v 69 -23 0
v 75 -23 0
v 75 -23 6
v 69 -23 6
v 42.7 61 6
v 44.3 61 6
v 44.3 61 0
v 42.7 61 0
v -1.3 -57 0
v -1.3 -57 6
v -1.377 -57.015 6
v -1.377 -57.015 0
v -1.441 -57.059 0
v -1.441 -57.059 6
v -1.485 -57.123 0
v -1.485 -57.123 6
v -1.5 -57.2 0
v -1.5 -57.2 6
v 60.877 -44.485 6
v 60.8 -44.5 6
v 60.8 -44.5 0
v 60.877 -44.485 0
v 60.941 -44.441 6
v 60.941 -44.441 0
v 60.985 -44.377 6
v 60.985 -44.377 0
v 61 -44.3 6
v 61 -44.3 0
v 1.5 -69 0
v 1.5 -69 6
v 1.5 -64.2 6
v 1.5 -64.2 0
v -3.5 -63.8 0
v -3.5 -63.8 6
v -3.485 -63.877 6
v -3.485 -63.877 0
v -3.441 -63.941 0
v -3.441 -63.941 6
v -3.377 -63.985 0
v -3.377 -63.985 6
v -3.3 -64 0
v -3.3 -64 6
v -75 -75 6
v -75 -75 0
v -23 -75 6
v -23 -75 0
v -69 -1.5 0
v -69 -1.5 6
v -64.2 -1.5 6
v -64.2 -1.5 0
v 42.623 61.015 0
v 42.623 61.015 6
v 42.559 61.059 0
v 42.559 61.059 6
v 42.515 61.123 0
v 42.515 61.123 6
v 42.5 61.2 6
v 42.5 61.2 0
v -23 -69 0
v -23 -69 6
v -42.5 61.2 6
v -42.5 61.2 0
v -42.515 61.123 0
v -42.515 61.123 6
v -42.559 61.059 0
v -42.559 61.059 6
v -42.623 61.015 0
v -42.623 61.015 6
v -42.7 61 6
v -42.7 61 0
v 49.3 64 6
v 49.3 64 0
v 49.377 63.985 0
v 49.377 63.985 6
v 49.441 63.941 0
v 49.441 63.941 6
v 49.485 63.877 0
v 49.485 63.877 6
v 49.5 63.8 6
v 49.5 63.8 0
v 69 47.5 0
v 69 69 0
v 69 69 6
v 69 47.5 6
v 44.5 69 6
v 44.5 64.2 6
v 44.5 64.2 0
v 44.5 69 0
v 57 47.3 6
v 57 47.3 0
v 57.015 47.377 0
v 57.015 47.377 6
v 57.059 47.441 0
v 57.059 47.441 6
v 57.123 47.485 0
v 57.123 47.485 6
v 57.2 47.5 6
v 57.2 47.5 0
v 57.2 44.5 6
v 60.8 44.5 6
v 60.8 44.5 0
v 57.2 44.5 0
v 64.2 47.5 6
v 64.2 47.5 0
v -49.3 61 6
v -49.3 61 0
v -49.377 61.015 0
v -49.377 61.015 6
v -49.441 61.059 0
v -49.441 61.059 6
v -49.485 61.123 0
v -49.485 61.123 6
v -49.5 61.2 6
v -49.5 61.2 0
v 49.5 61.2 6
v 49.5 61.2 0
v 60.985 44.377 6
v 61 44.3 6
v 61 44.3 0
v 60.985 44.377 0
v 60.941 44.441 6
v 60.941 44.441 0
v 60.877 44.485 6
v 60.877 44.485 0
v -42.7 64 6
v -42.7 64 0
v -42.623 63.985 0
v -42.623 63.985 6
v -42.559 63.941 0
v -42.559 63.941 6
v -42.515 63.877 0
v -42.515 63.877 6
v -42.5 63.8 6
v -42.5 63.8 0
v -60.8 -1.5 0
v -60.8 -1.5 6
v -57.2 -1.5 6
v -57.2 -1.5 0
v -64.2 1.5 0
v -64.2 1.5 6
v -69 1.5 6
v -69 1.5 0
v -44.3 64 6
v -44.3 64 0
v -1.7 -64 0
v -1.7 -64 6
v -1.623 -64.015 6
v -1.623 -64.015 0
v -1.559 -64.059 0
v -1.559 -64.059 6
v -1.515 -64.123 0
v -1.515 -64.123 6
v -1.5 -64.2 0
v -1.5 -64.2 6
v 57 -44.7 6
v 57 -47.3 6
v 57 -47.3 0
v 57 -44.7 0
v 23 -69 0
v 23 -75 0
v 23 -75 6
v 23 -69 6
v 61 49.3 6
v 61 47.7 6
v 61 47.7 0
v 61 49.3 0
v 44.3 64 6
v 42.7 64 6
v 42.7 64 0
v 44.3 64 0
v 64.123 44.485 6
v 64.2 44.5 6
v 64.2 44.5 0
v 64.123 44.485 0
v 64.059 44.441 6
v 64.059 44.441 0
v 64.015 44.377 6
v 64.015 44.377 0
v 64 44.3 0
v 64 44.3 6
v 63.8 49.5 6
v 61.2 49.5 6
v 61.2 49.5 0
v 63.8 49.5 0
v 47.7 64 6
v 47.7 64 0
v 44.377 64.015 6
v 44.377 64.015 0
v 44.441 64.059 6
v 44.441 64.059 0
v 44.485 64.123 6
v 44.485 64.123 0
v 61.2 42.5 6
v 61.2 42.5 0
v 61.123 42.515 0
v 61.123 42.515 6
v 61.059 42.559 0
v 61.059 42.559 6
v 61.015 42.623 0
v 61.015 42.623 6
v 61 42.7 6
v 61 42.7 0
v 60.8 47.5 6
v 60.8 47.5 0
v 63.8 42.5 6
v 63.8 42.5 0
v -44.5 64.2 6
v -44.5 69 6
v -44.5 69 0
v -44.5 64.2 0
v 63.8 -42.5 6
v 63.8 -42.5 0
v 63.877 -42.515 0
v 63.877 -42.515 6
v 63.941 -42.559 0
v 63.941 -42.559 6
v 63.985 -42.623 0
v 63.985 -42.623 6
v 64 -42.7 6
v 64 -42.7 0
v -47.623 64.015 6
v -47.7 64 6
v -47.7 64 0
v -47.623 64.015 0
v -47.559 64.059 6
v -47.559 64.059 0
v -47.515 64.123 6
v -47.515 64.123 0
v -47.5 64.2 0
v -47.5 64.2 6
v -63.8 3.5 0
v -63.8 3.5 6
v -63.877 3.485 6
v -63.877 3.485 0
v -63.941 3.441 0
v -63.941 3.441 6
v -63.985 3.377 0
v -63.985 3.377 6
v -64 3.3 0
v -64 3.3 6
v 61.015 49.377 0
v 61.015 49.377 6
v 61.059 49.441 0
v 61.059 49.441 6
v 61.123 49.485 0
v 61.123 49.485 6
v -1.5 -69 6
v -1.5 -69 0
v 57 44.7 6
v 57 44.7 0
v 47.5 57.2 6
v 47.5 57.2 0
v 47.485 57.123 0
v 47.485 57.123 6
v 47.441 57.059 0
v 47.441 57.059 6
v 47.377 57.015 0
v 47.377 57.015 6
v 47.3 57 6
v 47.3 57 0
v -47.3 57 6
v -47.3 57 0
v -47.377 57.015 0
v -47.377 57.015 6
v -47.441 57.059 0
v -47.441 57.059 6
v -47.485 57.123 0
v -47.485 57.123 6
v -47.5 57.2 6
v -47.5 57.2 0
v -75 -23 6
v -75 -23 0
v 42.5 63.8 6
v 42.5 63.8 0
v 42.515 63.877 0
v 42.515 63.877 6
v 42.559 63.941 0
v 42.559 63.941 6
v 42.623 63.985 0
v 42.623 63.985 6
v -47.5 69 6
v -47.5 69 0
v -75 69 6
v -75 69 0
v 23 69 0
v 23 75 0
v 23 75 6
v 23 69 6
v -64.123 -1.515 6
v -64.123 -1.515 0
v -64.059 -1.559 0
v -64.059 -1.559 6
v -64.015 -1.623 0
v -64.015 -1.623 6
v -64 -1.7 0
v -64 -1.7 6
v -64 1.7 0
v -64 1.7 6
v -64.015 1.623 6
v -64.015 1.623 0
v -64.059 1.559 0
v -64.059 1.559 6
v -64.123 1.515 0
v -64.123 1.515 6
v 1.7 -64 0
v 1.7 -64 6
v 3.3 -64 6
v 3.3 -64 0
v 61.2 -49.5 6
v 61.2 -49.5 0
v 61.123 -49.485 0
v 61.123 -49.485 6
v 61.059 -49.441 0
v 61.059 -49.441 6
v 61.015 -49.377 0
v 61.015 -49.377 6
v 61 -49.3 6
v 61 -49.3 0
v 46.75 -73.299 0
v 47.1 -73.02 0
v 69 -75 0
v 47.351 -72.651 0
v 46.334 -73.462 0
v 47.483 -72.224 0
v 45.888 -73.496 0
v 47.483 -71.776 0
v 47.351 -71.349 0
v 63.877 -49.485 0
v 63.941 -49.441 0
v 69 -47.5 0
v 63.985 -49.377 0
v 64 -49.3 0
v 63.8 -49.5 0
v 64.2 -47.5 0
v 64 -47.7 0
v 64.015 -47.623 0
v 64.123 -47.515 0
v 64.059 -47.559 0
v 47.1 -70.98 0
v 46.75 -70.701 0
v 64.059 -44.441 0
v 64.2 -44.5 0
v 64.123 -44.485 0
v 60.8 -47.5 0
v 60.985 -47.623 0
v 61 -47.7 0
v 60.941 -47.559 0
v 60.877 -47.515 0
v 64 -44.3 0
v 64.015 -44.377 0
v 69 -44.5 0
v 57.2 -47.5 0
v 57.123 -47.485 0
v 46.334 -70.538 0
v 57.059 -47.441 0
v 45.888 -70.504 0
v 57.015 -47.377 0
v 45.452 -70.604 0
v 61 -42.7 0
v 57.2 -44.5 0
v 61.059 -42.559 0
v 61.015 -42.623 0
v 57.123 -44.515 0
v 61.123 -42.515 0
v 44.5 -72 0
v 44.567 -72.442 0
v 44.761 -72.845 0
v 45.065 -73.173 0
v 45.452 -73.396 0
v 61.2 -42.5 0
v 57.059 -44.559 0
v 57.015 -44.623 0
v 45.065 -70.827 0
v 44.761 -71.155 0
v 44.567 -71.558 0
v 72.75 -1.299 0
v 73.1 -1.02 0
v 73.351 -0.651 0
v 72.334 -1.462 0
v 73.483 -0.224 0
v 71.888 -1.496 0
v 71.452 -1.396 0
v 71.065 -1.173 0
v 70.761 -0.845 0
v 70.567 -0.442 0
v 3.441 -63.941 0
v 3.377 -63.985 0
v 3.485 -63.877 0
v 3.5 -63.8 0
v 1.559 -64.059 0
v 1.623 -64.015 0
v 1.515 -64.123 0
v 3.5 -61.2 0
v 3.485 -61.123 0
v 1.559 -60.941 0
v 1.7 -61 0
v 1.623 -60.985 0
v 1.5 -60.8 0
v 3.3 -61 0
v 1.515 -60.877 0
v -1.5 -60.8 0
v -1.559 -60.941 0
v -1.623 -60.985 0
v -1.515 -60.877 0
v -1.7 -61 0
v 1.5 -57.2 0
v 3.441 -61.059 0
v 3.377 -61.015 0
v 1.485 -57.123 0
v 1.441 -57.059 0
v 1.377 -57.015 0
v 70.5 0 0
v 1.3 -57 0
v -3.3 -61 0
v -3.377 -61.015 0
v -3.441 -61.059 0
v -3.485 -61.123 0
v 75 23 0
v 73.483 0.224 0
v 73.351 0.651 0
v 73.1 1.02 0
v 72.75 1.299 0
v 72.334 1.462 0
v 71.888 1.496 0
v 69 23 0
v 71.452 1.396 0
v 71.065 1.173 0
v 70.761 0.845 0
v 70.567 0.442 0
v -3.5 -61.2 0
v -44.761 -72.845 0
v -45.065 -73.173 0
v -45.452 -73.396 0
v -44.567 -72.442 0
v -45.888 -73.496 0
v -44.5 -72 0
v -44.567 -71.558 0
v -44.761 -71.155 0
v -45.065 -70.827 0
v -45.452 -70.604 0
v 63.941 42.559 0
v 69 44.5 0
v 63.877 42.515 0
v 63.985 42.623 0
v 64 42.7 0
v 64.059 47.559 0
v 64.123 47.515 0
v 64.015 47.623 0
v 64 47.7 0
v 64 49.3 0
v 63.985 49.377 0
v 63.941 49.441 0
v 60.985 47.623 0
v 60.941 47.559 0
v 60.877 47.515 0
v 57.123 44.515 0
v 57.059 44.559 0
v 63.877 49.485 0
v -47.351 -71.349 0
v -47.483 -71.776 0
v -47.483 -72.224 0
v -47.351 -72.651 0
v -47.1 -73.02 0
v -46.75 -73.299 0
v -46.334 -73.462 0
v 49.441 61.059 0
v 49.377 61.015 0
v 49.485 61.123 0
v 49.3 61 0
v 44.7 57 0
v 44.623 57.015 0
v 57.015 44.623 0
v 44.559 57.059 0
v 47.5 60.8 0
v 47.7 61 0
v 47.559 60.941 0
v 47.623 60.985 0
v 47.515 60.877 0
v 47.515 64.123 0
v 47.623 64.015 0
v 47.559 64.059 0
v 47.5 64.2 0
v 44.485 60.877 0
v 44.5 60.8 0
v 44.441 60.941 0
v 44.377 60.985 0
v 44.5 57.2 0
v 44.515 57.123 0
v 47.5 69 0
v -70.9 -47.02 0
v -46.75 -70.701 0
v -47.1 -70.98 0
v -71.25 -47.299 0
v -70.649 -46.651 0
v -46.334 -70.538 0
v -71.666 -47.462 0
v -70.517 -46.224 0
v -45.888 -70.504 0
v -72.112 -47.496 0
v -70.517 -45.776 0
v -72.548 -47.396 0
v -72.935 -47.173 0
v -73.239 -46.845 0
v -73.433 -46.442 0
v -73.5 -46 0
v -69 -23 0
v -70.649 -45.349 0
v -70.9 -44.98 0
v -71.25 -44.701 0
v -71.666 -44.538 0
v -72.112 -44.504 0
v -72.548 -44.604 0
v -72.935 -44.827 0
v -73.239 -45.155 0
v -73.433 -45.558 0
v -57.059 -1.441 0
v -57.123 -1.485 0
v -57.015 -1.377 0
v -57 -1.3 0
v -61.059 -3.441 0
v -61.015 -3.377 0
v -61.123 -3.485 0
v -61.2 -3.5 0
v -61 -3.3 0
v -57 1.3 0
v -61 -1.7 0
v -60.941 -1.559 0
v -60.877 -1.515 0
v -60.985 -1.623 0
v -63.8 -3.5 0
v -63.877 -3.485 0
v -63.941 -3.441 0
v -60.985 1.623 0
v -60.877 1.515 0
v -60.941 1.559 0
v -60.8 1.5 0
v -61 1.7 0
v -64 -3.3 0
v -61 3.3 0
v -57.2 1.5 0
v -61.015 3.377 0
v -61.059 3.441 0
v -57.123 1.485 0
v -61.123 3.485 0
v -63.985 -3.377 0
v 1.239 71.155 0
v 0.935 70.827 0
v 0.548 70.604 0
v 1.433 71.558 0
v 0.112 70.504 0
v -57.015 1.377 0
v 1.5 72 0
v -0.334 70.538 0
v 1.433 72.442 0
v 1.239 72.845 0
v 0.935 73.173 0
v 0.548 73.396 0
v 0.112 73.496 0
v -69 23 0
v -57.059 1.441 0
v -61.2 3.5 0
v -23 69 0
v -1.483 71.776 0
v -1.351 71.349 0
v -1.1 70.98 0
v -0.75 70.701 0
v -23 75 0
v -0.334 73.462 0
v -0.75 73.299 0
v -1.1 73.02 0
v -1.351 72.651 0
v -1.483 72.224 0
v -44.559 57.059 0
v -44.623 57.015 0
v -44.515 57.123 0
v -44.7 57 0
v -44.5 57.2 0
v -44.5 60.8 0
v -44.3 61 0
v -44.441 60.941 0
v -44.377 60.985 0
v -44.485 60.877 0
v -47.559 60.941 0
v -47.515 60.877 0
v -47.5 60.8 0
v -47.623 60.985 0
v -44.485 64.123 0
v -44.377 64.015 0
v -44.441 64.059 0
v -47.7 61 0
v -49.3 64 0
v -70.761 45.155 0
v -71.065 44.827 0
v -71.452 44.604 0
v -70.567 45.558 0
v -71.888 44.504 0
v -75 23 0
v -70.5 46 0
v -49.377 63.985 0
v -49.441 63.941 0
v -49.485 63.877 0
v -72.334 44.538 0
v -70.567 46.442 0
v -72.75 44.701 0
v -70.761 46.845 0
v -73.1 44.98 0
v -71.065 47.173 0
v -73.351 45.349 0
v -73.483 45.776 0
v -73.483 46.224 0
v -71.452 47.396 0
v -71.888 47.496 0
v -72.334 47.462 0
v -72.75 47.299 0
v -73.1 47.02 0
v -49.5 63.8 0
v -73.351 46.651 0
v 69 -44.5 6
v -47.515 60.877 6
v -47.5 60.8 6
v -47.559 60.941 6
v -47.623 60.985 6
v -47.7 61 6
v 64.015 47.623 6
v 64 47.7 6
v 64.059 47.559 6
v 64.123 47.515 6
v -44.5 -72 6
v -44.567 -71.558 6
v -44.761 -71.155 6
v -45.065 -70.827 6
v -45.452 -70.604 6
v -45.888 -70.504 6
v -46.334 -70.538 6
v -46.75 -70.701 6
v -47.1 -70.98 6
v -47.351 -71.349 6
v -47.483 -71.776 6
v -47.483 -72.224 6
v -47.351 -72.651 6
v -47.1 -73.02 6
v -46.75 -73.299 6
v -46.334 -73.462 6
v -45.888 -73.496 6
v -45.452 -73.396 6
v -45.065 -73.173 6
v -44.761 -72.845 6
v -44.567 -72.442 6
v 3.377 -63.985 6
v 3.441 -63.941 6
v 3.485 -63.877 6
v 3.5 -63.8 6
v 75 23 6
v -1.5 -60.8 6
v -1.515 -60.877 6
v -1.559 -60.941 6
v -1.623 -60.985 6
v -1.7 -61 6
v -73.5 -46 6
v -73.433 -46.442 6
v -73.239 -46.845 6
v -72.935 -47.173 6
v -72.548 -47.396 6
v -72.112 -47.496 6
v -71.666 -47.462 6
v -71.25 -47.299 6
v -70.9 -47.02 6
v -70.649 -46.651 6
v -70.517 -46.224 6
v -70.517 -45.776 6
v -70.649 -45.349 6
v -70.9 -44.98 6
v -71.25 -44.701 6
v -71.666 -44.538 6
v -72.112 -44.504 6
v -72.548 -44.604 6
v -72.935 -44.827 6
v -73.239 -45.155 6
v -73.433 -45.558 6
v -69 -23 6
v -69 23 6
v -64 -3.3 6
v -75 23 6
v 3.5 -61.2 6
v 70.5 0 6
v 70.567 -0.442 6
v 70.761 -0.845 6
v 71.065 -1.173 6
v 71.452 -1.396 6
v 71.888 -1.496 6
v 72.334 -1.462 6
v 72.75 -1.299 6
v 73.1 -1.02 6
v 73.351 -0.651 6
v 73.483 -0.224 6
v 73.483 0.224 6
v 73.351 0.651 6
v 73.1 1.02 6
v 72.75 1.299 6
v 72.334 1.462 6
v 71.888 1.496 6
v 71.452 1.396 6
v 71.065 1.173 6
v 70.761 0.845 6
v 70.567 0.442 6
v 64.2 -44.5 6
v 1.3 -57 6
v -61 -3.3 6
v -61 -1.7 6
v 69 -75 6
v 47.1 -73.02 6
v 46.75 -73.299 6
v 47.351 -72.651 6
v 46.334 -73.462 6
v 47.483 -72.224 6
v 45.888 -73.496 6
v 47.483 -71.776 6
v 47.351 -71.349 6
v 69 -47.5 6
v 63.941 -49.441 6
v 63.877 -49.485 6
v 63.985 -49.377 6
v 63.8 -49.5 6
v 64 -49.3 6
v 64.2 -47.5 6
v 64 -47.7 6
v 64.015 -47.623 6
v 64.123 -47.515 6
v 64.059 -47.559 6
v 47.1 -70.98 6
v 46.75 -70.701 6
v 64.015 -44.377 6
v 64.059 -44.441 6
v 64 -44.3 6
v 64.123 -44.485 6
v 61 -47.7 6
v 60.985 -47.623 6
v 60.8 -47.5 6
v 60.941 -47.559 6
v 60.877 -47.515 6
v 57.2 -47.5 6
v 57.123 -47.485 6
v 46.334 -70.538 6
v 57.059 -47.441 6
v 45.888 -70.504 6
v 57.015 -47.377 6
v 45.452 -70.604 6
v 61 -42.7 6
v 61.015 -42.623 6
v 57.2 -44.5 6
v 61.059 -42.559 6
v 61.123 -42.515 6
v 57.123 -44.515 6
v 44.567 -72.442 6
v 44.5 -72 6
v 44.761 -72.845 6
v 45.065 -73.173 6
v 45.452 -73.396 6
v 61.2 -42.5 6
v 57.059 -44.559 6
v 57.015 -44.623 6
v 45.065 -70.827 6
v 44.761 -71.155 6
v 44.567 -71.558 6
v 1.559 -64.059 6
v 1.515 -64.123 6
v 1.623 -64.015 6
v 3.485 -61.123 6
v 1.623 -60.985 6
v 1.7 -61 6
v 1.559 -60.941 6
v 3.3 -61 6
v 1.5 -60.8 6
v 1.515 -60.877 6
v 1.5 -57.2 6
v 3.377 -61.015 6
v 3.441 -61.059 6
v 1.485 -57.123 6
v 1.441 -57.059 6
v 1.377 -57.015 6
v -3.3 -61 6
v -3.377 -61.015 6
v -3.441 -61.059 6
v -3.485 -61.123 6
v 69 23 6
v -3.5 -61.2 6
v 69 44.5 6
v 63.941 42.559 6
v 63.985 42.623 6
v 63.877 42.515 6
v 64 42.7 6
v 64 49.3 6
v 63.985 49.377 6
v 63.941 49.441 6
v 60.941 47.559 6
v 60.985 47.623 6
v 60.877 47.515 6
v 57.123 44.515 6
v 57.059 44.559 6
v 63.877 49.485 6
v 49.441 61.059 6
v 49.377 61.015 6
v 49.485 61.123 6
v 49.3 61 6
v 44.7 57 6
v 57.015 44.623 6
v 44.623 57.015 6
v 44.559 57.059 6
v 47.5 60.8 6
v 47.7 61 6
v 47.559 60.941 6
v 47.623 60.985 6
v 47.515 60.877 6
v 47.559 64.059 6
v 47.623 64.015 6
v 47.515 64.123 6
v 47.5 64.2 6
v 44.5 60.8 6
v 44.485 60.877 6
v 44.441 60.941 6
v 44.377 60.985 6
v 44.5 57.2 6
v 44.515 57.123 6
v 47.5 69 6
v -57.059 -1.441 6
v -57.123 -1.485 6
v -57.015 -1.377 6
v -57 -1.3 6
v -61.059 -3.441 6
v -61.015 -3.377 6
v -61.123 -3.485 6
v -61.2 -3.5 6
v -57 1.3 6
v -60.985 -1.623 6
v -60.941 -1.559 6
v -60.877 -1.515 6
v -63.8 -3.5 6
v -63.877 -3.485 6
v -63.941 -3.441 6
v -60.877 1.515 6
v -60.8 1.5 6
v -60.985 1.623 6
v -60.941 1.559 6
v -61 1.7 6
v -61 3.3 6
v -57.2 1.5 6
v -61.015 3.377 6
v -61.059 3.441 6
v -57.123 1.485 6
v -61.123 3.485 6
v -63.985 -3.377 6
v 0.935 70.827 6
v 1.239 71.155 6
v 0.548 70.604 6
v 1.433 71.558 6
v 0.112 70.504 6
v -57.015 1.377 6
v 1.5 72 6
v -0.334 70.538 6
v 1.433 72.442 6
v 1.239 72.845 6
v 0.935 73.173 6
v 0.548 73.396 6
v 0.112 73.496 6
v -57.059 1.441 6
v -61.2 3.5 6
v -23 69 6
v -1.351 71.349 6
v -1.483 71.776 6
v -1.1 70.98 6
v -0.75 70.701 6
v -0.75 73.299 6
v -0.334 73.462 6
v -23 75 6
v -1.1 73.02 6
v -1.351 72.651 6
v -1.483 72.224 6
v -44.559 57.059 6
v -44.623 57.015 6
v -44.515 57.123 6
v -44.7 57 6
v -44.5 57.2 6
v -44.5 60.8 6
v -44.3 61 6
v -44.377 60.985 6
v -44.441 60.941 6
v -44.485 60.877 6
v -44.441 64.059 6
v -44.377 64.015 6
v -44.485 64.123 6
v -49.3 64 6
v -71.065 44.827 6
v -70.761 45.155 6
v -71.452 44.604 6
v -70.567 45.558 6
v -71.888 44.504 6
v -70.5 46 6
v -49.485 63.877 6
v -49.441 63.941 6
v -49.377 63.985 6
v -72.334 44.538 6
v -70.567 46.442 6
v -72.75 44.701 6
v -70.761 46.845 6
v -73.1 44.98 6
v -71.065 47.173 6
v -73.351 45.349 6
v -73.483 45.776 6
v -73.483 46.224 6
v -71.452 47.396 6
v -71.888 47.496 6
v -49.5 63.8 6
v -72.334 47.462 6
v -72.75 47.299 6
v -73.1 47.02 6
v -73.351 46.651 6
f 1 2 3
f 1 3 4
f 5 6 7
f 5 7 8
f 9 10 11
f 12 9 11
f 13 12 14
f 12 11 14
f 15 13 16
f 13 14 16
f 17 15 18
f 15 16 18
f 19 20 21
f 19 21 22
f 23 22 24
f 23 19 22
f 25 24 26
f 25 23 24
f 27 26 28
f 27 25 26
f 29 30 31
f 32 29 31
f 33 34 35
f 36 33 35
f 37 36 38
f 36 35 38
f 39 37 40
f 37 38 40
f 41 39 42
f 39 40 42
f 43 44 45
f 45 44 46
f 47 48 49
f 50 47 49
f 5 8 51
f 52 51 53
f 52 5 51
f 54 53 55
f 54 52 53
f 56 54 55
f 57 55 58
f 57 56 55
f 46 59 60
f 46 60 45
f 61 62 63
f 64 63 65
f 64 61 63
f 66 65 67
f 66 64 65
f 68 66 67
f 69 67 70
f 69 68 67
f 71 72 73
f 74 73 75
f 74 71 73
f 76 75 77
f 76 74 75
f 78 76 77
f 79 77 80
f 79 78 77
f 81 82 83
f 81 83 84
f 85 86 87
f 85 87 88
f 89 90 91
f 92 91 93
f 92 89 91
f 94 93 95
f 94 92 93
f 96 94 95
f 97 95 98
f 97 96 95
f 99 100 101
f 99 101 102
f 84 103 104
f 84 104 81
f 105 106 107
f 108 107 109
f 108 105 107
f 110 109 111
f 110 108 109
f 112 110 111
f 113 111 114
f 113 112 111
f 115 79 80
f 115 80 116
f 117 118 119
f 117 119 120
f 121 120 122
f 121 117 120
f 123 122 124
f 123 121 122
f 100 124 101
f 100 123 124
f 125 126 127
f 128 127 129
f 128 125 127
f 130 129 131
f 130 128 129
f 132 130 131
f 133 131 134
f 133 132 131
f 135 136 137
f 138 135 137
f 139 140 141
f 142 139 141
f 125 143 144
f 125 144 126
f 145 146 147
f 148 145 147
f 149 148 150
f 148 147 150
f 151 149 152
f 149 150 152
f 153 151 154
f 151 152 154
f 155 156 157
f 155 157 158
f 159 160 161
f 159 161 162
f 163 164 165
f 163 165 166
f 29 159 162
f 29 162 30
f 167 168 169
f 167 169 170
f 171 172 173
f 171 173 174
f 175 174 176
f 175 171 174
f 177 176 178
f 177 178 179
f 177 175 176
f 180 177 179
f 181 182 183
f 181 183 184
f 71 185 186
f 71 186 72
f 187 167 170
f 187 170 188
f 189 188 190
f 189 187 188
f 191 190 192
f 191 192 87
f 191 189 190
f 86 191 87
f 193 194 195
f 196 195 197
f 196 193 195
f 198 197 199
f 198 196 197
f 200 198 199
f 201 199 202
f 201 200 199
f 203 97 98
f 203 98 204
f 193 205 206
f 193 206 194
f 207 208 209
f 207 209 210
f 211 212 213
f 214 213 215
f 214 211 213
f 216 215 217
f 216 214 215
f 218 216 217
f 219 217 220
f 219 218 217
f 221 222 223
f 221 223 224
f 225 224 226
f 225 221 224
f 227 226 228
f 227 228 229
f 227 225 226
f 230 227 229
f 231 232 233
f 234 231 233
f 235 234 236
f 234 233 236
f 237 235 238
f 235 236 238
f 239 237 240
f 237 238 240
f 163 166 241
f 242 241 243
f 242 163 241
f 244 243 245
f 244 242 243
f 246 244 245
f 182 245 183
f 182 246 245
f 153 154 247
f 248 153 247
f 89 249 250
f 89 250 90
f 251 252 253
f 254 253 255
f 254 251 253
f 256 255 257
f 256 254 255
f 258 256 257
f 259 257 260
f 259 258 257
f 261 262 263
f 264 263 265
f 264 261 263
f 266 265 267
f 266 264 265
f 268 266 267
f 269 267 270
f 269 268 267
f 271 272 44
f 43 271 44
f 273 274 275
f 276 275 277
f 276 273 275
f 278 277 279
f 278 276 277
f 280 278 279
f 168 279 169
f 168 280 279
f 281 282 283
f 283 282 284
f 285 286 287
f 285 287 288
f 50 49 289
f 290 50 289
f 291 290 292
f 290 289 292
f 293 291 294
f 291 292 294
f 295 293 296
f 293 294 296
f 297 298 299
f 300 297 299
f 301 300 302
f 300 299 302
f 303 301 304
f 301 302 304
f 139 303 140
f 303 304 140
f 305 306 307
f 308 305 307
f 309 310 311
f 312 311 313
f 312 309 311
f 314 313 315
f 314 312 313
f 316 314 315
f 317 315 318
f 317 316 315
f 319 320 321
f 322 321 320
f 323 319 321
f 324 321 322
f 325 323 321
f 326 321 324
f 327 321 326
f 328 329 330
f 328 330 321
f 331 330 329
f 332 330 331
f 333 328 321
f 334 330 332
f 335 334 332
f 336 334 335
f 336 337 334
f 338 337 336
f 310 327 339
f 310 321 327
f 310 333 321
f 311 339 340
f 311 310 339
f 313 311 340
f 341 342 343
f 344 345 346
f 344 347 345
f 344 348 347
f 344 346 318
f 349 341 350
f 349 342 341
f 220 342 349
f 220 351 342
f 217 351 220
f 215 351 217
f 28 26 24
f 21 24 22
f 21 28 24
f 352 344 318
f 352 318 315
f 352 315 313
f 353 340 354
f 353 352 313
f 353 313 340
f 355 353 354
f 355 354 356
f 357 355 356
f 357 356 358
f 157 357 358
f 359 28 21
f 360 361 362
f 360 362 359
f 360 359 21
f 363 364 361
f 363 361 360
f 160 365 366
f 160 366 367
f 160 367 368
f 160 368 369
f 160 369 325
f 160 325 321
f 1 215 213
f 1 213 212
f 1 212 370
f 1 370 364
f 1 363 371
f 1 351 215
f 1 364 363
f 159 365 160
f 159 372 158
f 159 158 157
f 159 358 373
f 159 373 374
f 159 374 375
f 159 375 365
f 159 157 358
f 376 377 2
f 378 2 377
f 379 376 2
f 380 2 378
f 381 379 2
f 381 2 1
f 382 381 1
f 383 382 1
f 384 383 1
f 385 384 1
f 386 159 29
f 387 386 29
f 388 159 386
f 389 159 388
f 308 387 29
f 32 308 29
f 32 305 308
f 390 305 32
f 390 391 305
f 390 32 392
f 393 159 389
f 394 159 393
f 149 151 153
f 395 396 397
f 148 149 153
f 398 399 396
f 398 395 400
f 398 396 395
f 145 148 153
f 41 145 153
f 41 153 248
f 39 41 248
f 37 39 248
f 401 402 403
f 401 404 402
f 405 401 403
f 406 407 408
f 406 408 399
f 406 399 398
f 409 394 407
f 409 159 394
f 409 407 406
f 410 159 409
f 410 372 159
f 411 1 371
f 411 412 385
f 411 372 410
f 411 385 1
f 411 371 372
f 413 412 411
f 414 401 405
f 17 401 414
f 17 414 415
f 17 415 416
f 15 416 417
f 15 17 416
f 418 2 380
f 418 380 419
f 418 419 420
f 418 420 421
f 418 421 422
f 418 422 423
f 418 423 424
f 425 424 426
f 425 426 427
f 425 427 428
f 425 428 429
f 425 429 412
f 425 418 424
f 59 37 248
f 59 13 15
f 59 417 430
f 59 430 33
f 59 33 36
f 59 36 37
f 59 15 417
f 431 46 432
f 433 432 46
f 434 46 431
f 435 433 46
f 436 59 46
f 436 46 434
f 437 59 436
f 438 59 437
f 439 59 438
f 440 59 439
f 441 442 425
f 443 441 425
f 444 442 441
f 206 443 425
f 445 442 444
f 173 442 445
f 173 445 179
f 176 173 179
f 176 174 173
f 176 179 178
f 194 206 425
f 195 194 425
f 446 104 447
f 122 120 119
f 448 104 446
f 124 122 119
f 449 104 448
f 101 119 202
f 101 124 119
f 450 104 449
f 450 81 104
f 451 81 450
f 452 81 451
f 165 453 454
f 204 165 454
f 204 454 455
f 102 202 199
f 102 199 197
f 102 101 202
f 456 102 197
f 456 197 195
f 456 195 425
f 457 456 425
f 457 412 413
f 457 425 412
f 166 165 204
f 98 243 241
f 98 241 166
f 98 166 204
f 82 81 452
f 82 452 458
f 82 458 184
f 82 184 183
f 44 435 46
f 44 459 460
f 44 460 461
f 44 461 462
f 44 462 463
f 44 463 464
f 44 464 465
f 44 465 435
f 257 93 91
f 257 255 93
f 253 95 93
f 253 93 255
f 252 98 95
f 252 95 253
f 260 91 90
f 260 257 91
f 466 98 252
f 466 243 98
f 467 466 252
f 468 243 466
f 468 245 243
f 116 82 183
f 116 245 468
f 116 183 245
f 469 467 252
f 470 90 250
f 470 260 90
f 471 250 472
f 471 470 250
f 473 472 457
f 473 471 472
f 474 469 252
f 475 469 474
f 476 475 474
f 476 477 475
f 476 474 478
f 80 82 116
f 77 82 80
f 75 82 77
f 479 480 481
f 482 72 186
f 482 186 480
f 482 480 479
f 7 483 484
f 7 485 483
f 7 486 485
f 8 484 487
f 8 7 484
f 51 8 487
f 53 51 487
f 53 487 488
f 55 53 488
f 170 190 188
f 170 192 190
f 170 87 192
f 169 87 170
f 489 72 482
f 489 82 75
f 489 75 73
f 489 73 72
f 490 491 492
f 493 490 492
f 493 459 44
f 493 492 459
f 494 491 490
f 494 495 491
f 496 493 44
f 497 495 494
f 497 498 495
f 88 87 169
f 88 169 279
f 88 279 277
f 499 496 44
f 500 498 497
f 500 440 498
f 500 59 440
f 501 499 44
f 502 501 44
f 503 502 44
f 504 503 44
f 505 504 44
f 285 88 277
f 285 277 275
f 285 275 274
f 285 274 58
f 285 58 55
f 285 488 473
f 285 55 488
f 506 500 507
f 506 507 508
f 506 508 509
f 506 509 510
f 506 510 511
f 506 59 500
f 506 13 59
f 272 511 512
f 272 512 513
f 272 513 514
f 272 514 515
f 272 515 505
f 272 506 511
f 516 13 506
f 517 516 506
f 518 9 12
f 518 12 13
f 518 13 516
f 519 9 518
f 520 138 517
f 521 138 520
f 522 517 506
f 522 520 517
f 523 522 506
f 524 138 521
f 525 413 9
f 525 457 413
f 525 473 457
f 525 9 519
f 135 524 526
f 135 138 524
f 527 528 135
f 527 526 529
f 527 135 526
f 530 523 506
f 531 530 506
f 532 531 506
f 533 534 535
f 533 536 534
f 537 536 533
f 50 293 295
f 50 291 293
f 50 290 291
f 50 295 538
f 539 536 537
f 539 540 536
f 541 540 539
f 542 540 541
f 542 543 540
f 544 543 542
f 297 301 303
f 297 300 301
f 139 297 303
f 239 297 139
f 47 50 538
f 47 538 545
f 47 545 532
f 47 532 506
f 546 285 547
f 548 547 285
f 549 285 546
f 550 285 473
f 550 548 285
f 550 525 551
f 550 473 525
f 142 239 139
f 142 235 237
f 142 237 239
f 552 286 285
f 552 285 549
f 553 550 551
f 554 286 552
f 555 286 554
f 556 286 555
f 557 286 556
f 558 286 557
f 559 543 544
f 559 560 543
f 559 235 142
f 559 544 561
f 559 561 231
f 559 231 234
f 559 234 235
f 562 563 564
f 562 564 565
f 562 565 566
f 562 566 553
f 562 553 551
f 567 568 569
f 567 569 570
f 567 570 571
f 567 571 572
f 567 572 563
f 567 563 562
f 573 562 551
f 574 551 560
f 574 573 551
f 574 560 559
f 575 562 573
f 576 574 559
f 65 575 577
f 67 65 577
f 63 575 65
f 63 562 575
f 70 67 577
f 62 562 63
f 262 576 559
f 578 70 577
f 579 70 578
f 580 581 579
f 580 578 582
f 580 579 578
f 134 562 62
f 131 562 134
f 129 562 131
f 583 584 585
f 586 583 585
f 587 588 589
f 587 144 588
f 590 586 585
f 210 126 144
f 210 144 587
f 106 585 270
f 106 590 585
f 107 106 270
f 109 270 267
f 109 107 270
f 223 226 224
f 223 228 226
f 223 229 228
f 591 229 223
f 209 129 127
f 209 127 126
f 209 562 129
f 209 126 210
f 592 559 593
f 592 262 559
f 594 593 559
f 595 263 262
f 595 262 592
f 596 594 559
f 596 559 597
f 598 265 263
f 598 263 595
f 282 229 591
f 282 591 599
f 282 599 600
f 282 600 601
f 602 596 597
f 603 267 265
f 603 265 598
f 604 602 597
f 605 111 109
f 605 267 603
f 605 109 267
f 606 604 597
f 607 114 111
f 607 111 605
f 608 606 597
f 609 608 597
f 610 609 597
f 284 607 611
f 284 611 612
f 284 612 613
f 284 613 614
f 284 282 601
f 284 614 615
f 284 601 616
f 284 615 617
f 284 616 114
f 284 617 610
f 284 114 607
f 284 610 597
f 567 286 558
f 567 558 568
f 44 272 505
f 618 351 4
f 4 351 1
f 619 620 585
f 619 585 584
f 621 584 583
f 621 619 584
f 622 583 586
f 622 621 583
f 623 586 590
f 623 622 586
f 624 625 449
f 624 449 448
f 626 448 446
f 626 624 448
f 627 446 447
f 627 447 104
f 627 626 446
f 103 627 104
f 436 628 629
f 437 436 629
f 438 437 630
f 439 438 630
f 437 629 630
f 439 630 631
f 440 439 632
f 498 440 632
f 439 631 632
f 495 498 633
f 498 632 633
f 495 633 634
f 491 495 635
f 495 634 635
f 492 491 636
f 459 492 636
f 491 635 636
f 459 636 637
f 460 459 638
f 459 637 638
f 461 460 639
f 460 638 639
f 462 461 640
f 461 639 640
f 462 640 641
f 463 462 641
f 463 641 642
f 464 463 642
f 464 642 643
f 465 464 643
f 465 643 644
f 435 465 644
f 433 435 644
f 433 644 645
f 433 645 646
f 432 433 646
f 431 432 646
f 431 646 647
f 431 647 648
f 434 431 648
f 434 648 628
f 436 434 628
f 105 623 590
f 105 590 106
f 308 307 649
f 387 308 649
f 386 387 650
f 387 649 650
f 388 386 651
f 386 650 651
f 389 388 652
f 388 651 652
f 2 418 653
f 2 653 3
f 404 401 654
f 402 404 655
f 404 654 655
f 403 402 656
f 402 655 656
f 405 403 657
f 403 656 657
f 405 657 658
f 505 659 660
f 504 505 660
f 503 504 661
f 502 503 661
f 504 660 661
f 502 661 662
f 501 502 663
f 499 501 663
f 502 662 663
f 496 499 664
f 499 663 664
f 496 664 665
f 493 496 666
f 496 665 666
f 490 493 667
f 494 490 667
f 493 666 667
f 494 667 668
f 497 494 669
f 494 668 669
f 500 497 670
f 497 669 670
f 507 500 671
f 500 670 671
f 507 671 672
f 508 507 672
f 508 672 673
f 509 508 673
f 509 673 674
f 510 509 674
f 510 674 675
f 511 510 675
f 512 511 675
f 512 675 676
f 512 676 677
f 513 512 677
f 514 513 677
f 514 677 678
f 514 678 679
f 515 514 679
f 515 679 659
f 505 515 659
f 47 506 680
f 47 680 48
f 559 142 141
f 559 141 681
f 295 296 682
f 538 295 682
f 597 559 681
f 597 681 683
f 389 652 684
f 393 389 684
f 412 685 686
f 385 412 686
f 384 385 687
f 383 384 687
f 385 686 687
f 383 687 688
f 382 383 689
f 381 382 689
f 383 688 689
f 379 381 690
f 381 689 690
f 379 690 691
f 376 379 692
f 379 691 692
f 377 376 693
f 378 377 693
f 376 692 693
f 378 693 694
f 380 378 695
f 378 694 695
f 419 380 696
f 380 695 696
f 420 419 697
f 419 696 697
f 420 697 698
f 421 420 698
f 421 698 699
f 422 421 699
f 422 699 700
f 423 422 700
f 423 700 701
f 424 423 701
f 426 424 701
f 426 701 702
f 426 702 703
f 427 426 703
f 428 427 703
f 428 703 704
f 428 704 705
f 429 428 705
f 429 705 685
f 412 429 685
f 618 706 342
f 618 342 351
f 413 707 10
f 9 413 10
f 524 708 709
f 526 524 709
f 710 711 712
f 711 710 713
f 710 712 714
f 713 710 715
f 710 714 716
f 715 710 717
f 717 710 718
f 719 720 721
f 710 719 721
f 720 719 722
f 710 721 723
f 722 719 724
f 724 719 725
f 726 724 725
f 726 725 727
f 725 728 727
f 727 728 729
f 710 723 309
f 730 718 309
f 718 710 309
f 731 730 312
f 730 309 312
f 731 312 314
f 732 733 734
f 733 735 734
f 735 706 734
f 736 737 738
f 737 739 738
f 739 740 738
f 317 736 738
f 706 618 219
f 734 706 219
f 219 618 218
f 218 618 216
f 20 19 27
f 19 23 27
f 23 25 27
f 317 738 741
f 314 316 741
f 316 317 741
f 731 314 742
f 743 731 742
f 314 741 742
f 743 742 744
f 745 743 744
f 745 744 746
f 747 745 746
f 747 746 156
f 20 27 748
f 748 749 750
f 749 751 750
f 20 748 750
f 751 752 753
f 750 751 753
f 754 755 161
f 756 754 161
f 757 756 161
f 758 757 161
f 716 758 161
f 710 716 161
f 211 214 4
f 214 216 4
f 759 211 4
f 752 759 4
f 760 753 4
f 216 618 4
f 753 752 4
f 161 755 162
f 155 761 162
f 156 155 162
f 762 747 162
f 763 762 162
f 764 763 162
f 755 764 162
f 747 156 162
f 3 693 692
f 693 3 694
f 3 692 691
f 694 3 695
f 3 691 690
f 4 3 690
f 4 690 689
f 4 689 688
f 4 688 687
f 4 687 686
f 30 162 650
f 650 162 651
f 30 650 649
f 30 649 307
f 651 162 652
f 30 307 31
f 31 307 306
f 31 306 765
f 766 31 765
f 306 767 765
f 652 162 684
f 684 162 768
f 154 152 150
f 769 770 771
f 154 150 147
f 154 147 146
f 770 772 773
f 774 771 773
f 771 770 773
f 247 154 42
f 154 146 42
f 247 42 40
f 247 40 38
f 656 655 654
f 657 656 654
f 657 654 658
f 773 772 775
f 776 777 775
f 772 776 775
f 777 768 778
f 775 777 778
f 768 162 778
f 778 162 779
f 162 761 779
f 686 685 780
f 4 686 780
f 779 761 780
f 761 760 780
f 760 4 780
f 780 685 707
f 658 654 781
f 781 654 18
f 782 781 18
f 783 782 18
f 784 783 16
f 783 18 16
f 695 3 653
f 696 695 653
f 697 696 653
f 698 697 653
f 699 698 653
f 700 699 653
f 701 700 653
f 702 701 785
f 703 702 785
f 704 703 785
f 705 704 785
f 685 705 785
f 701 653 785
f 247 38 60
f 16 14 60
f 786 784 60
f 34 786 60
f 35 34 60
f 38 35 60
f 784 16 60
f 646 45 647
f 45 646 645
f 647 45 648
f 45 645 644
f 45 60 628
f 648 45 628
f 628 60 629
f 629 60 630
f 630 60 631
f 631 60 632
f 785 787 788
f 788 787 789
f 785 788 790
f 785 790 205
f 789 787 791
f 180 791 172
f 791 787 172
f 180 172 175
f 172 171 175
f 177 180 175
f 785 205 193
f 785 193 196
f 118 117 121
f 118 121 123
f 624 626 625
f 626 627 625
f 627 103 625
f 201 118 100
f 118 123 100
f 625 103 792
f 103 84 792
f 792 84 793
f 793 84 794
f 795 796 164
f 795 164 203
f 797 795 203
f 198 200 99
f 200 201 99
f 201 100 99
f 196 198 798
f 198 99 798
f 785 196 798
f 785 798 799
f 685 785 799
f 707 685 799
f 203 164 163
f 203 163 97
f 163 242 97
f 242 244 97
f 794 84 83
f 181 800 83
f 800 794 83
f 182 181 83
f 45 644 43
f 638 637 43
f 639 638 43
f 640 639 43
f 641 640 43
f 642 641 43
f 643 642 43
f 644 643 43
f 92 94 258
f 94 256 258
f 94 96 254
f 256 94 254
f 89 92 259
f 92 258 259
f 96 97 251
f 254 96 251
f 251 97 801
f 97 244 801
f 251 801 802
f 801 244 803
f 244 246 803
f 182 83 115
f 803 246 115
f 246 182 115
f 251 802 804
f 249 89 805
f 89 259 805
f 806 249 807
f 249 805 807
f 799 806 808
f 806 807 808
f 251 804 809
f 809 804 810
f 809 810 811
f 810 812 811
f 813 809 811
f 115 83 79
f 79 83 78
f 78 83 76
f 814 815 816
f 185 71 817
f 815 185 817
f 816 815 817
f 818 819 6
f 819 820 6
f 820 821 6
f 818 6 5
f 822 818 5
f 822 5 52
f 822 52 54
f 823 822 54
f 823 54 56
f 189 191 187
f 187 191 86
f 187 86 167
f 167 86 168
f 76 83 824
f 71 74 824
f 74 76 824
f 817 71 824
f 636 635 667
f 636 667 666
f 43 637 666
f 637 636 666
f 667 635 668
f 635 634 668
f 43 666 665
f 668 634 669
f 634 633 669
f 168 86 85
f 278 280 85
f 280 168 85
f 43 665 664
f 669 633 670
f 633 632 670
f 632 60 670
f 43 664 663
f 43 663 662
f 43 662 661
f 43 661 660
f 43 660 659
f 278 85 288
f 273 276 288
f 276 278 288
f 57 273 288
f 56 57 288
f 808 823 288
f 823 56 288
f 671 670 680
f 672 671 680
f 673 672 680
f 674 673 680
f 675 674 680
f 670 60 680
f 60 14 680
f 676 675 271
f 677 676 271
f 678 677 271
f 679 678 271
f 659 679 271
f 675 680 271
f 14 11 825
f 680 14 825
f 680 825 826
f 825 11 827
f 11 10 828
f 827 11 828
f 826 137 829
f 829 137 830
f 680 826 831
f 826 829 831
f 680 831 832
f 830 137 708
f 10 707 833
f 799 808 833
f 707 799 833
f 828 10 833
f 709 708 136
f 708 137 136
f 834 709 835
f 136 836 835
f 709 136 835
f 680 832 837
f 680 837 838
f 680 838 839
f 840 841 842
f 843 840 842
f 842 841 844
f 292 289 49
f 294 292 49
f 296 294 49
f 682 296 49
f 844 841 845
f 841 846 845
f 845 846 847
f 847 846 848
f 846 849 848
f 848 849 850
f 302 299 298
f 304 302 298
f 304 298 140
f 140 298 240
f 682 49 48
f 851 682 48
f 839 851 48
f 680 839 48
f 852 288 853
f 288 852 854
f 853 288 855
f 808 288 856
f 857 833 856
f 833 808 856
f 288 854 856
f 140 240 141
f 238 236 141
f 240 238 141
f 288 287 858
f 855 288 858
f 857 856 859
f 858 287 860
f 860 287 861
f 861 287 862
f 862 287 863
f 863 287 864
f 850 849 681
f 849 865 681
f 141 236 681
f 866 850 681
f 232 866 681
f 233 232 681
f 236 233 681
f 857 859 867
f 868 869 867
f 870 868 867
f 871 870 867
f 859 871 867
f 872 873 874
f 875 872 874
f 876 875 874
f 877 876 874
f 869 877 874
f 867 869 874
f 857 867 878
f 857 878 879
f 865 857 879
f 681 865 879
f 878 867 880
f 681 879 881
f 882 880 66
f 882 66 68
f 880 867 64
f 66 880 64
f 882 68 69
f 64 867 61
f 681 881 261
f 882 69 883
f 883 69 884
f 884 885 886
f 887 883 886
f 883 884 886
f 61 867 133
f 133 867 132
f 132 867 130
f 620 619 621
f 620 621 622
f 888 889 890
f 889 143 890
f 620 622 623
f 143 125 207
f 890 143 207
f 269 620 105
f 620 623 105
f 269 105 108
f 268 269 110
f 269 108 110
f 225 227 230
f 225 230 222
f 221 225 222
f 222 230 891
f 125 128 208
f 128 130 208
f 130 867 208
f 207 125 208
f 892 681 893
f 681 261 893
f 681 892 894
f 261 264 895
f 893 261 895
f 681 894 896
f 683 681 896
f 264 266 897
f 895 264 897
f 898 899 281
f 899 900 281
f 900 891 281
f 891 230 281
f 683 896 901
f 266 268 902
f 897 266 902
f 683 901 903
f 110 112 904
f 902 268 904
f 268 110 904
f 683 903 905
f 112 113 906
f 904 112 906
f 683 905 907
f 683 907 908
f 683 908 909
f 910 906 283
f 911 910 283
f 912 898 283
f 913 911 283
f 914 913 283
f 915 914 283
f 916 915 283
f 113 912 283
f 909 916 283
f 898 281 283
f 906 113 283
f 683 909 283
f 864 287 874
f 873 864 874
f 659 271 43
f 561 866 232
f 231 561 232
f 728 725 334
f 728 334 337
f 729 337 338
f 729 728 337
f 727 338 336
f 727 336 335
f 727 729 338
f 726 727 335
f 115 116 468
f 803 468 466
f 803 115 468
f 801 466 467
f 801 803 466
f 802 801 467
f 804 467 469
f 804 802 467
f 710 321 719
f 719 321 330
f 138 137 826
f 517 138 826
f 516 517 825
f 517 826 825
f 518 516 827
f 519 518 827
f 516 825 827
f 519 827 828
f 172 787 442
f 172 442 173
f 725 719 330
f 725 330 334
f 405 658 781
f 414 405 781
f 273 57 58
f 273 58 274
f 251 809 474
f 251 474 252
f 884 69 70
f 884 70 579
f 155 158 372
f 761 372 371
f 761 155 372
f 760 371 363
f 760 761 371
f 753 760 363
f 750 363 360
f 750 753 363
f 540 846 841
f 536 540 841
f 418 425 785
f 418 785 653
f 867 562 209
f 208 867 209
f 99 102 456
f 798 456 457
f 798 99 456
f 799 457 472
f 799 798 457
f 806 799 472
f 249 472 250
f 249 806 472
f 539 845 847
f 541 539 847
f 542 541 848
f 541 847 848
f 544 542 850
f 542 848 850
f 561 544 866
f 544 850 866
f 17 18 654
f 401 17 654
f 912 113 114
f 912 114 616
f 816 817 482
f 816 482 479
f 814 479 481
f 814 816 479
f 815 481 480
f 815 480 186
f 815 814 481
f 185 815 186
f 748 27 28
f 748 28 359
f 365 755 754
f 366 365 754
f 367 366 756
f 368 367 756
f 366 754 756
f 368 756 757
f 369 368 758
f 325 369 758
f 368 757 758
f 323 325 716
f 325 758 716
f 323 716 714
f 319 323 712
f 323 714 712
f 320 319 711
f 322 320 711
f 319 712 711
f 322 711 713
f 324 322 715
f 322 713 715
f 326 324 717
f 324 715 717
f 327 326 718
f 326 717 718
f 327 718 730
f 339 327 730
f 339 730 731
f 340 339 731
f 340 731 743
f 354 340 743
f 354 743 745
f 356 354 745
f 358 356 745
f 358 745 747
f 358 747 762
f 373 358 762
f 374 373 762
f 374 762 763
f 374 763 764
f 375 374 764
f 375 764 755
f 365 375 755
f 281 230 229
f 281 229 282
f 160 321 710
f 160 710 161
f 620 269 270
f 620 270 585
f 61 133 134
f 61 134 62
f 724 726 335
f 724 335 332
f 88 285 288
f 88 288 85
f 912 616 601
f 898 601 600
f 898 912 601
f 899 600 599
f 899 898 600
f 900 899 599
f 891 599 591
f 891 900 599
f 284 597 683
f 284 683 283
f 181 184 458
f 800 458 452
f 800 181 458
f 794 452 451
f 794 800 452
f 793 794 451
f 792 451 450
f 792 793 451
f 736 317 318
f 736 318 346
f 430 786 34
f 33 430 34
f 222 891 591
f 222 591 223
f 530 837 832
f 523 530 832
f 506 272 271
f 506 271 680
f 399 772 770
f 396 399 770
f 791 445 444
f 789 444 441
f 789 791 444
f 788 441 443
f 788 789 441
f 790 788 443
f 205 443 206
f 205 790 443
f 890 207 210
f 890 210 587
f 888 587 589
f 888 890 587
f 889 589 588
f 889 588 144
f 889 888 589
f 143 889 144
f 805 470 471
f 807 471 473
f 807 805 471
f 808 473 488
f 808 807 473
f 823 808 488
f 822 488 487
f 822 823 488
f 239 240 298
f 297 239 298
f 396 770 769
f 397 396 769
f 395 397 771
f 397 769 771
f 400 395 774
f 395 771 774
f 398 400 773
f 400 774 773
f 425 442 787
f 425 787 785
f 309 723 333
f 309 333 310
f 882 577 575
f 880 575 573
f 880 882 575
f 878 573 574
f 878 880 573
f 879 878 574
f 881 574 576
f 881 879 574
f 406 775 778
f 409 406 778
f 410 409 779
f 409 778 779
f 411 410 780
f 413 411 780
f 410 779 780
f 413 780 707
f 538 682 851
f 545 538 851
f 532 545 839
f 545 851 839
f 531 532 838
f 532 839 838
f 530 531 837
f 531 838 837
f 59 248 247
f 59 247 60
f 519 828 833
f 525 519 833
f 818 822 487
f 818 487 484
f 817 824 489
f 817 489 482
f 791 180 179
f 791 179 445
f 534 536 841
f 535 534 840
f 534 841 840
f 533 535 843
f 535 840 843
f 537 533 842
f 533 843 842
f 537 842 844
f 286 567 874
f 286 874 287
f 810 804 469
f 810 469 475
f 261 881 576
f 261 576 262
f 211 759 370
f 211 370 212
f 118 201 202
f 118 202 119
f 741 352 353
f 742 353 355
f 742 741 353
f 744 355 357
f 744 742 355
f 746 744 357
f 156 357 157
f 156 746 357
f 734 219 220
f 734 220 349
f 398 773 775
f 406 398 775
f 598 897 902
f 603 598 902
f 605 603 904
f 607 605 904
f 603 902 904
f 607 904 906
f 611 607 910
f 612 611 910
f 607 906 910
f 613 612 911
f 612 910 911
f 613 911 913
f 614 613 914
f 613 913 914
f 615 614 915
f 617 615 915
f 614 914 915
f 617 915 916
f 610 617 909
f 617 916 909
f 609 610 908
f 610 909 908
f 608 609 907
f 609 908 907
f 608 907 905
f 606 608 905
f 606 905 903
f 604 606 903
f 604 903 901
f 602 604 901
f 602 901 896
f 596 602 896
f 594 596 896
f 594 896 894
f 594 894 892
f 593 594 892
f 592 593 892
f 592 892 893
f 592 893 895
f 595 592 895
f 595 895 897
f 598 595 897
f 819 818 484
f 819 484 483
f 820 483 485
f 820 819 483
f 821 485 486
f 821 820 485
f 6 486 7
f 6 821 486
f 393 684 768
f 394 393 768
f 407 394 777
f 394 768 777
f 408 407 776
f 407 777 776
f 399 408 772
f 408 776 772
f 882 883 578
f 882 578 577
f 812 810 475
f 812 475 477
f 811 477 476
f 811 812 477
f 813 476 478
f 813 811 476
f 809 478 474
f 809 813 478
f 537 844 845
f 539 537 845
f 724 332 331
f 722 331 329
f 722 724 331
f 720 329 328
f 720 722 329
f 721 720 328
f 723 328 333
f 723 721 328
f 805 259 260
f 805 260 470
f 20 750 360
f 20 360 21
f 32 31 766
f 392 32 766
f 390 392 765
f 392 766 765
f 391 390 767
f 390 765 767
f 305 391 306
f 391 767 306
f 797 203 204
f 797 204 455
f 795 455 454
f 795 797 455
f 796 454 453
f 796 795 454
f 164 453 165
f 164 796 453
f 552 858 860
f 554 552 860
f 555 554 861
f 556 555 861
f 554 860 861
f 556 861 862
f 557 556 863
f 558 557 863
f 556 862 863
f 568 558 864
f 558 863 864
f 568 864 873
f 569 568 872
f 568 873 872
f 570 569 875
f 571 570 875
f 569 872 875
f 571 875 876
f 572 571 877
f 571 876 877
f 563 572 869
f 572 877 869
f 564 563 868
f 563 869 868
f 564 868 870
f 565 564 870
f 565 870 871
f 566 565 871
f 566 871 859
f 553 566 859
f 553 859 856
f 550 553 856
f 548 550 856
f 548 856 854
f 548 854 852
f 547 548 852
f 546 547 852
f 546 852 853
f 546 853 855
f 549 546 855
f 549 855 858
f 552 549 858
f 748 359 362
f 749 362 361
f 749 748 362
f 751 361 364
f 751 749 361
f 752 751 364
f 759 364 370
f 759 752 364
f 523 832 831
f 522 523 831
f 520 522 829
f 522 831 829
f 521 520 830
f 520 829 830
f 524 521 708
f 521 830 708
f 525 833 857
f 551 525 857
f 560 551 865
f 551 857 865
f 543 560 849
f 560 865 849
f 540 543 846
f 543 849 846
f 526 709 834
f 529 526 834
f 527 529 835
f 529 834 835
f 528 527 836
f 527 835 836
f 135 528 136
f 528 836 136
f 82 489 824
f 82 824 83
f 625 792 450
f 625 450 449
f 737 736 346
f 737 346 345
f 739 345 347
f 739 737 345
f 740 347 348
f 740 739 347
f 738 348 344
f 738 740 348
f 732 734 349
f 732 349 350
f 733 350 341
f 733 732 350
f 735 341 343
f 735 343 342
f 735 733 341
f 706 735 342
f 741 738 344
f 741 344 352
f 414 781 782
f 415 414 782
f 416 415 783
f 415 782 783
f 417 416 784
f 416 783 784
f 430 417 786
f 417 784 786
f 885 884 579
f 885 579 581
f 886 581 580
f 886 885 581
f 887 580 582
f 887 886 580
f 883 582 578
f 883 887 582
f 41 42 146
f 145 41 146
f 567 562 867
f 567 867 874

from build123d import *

# Parameters (mm, degrees)
BOX_SIDE_DEPTH       = 6
SKETCH2_R            = 1.5
SCREW_CUT_OUTS_DEPTH = 107.235587258


with BuildPart() as part:
    # Sketch1 → Box Side (new body)
    with BuildSketch(Plane.XY):
        Polygon((-69, 69), (-23, 69), (-23, 75), (23, 75), (23, 69), (69, 69), (69, 23), (75, 23), (75, -23), (69, -23), (69, -69), (69, -75), (23, -75), (23, -69), (-23, -69), (-23, -75), (-69, -75), (-75, -75), (-75, -69), (-75, -23), (-69, -23), (-69, 23), (-75, 23), (-75, 69), align=None)
    extrude(amount=BOX_SIDE_DEPTH)

    # Sketch2 → Screw Cut-outs (cut, through all)
    with BuildSketch(Plane.XY.offset(6)):
        with Locations((0, 72)):
            Circle(SKETCH2_R)
        with Locations(Location((72, 0, 0), (0, 0, 180))):
            Circle(SKETCH2_R)
        with Locations((-46, -72)):
            Circle(SKETCH2_R)
        with Locations(Location((46, -72, 0), (0, 0, 180))):
            Circle(SKETCH2_R)
        with Locations((-72, 46)):
            Circle(SKETCH2_R)
        with Locations(Location((-72, -46, 0), (0, 0, 180))):
            Circle(SKETCH2_R)
        with BuildLine():
            Line((-44.5, 69), (-44.5, 64.2))
            ThreePointArc((-44.5, 64.2), (-44.441421356, 64.058578644), (-44.3, 64))
            Line((-44.3, 64), (-42.7, 64))
            ThreePointArc((-42.7, 64), (-42.558578644, 63.941421356), (-42.5, 63.8))
            Line((-42.5, 63.8), (-42.5, 61.2))
            ThreePointArc((-42.5, 61.2), (-42.558578644, 61.058578644), (-42.7, 61))
            Line((-42.7, 61), (-44.3, 61))
            ThreePointArc((-44.3, 61), (-44.441421356, 60.941421356), (-44.5, 60.8))
            Line((-44.5, 60.8), (-44.5, 57.2))
            ThreePointArc((-44.5, 57.2), (-44.558578644, 57.058578644), (-44.7, 57))
            Line((-44.7, 57), (-47.3, 57))
            ThreePointArc((-47.3, 57), (-47.441421356, 57.058578644), (-47.5, 57.2))
            Line((-47.5, 57.2), (-47.5, 60.8))
            ThreePointArc((-47.5, 60.8), (-47.558578644, 60.941421356), (-47.7, 61))
            Line((-47.7, 61), (-49.3, 61))
            ThreePointArc((-49.3, 61), (-49.441421356, 61.058578644), (-49.5, 61.2))
            Line((-49.5, 61.2), (-49.5, 63.8))
            ThreePointArc((-49.5, 63.8), (-49.441421356, 63.941421356), (-49.3, 64))
            Line((-49.3, 64), (-47.7, 64))
            ThreePointArc((-47.7, 64), (-47.558578644, 64.058578644), (-47.5, 64.2))
            Line((-47.5, 64.2), (-47.5, 69))
            Line((-47.5, 69), (-44.5, 69))
        make_face()
        with BuildLine():
            Line((47.5, 69), (47.5, 64.2))
            ThreePointArc((47.5, 64.2), (47.558578644, 64.058578644), (47.7, 64))
            Line((47.7, 64), (49.3, 64))
            ThreePointArc((49.3, 64), (49.441421356, 63.941421356), (49.5, 63.8))
            Line((49.5, 63.8), (49.5, 61.2))
            ThreePointArc((49.5, 61.2), (49.441421356, 61.058578644), (49.3, 61))
            Line((49.3, 61), (47.7, 61))
            ThreePointArc((47.7, 61), (47.558578644, 60.941421356), (47.5, 60.8))
            Line((47.5, 60.8), (47.5, 57.2))
            ThreePointArc((47.5, 57.2), (47.441421356, 57.058578644), (47.3, 57))
            Line((47.3, 57), (44.7, 57))
            ThreePointArc((44.7, 57), (44.558578644, 57.058578644), (44.5, 57.2))
            Line((44.5, 57.2), (44.5, 60.8))
            ThreePointArc((44.5, 60.8), (44.441421356, 60.941421356), (44.3, 61))
            Line((44.3, 61), (42.7, 61))
            ThreePointArc((42.7, 61), (42.558578644, 61.058578644), (42.5, 61.2))
            Line((42.5, 61.2), (42.5, 63.8))
            ThreePointArc((42.5, 63.8), (42.558578644, 63.941421356), (42.7, 64))
            Line((42.7, 64), (44.3, 64))
            ThreePointArc((44.3, 64), (44.441421356, 64.058578644), (44.5, 64.2))
            Line((44.5, 64.2), (44.5, 69))
            Line((44.5, 69), (47.5, 69))
        make_face()
        with BuildLine():
            Line((69, 44.5), (64.2, 44.5))
            ThreePointArc((64.2, 44.5), (64.058578644, 44.441421356), (64, 44.3))
            Line((64, 44.3), (64, 42.7))
            ThreePointArc((64, 42.7), (63.941421356, 42.558578644), (63.8, 42.5))
            Line((63.8, 42.5), (61.2, 42.5))
            ThreePointArc((61.2, 42.5), (61.058578644, 42.558578644), (61, 42.7))
            Line((61, 42.7), (61, 44.3))
            ThreePointArc((61, 44.3), (60.941421356, 44.441421356), (60.8, 44.5))
            Line((60.8, 44.5), (57.2, 44.5))
            ThreePointArc((57.2, 44.5), (57.058578644, 44.558578644), (57, 44.7))
            Line((57, 44.7), (57, 47.3))
            ThreePointArc((57, 47.3), (57.058578644, 47.441421356), (57.2, 47.5))
            Line((57.2, 47.5), (60.8, 47.5))
            ThreePointArc((60.8, 47.5), (60.941421356, 47.558578644), (61, 47.7))
            Line((61, 47.7), (61, 49.3))
            ThreePointArc((61, 49.3), (61.058578644, 49.441421356), (61.2, 49.5))
            Line((61.2, 49.5), (63.8, 49.5))
            ThreePointArc((63.8, 49.5), (63.941421356, 49.441421356), (64, 49.3))
            Line((64, 49.3), (64, 47.7))
            ThreePointArc((64, 47.7), (64.058578644, 47.558578644), (64.2, 47.5))
            Line((64.2, 47.5), (69, 47.5))
            Line((69, 47.5), (69, 44.5))
        make_face()
        with BuildLine():
            Line((69, -47.5), (64.2, -47.5))
            ThreePointArc((64.2, -47.5), (64.058578644, -47.558578644), (64, -47.7))
            Line((64, -47.7), (64, -49.3))
            ThreePointArc((64, -49.3), (63.941421356, -49.441421356), (63.8, -49.5))
            Line((63.8, -49.5), (61.2, -49.5))
            ThreePointArc((61.2, -49.5), (61.058578644, -49.441421356), (61, -49.3))
            Line((61, -49.3), (61, -47.7))
            ThreePointArc((61, -47.7), (60.941421356, -47.558578644), (60.8, -47.5))
            Line((60.8, -47.5), (57.2, -47.5))
            ThreePointArc((57.2, -47.5), (57.058578644, -47.441421356), (57, -47.3))
            Line((57, -47.3), (57, -44.7))
            ThreePointArc((57, -44.7), (57.058578644, -44.558578644), (57.2, -44.5))
            Line((57.2, -44.5), (60.8, -44.5))
            ThreePointArc((60.8, -44.5), (60.941421356, -44.441421356), (61, -44.3))
            Line((61, -44.3), (61, -42.7))
            ThreePointArc((61, -42.7), (61.058578644, -42.558578644), (61.2, -42.5))
            Line((61.2, -42.5), (63.8, -42.5))
            ThreePointArc((63.8, -42.5), (63.941421356, -42.558578644), (64, -42.7))
            Line((64, -42.7), (64, -44.3))
            ThreePointArc((64, -44.3), (64.058578644, -44.441421356), (64.2, -44.5))
            Line((64.2, -44.5), (69, -44.5))
            Line((69, -44.5), (69, -47.5))
        make_face()
        with BuildLine():
            Line((-1.5, -69), (1.5, -69))
            Line((1.5, -69), (1.5, -64.2))
            ThreePointArc((1.5, -64.2), (1.558578644, -64.058578644), (1.7, -64))
            Line((1.7, -64), (3.3, -64))
            ThreePointArc((3.3, -64), (3.441421356, -63.941421356), (3.5, -63.8))
            Line((3.5, -63.8), (3.5, -61.2))
            ThreePointArc((3.5, -61.2), (3.441421356, -61.058578644), (3.3, -61))
            Line((3.3, -61), (1.7, -61))
            ThreePointArc((1.7, -61), (1.558578644, -60.941421356), (1.5, -60.8))
            Line((1.5, -60.8), (1.5, -57.2))
            ThreePointArc((1.5, -57.2), (1.441421356, -57.058578644), (1.3, -57))
            Line((1.3, -57), (-1.3, -57))
            ThreePointArc((-1.3, -57), (-1.441421356, -57.058578644), (-1.5, -57.2))
            Line((-1.5, -57.2), (-1.5, -60.8))
            ThreePointArc((-1.5, -60.8), (-1.558578644, -60.941421356), (-1.7, -61))
            Line((-1.7, -61), (-3.3, -61))
            ThreePointArc((-3.3, -61), (-3.441421356, -61.058578644), (-3.5, -61.2))
            Line((-3.5, -61.2), (-3.5, -63.8))
            ThreePointArc((-3.5, -63.8), (-3.441421356, -63.941421356), (-3.3, -64))
            Line((-3.3, -64), (-1.7, -64))
            ThreePointArc((-1.7, -64), (-1.558578644, -64.058578644), (-1.5, -64.2))
            Line((-1.5, -64.2), (-1.5, -69))
        make_face()
        with BuildLine():
            Line((-69, -1.5), (-64.2, -1.5))
            ThreePointArc((-64.2, -1.5), (-64.058578644, -1.558578644), (-64, -1.7))
            Line((-64, -1.7), (-64, -3.3))
            ThreePointArc((-64, -3.3), (-63.941421356, -3.441421356), (-63.8, -3.5))
            Line((-63.8, -3.5), (-61.2, -3.5))
            ThreePointArc((-61.2, -3.5), (-61.058578644, -3.441421356), (-61, -3.3))
            Line((-61, -3.3), (-61, -1.7))
            ThreePointArc((-61, -1.7), (-60.941421356, -1.558578644), (-60.8, -1.5))
            Line((-60.8, -1.5), (-57.2, -1.5))
            ThreePointArc((-57.2, -1.5), (-57.058578644, -1.441421356), (-57, -1.3))
            Line((-57, -1.3), (-57, 1.3))
            ThreePointArc((-57, 1.3), (-57.058578644, 1.441421356), (-57.2, 1.5))
            Line((-57.2, 1.5), (-60.8, 1.5))
            ThreePointArc((-60.8, 1.5), (-60.941421356, 1.558578644), (-61, 1.7))
            Line((-61, 1.7), (-61, 3.3))
            ThreePointArc((-61, 3.3), (-61.058578644, 3.441421356), (-61.2, 3.5))
            Line((-61.2, 3.5), (-63.8, 3.5))
            ThreePointArc((-63.8, 3.5), (-63.941421356, 3.441421356), (-64, 3.3))
            Line((-64, 3.3), (-64, 1.7))
            ThreePointArc((-64, 1.7), (-64.058578644, 1.558578644), (-64.2, 1.5))
            Line((-64.2, 1.5), (-69, 1.5))
            Line((-69, 1.5), (-69, -1.5))
        make_face()
    extrude(amount=-SCREW_CUT_OUTS_DEPTH, mode=Mode.SUBTRACT)


solid = part.part
